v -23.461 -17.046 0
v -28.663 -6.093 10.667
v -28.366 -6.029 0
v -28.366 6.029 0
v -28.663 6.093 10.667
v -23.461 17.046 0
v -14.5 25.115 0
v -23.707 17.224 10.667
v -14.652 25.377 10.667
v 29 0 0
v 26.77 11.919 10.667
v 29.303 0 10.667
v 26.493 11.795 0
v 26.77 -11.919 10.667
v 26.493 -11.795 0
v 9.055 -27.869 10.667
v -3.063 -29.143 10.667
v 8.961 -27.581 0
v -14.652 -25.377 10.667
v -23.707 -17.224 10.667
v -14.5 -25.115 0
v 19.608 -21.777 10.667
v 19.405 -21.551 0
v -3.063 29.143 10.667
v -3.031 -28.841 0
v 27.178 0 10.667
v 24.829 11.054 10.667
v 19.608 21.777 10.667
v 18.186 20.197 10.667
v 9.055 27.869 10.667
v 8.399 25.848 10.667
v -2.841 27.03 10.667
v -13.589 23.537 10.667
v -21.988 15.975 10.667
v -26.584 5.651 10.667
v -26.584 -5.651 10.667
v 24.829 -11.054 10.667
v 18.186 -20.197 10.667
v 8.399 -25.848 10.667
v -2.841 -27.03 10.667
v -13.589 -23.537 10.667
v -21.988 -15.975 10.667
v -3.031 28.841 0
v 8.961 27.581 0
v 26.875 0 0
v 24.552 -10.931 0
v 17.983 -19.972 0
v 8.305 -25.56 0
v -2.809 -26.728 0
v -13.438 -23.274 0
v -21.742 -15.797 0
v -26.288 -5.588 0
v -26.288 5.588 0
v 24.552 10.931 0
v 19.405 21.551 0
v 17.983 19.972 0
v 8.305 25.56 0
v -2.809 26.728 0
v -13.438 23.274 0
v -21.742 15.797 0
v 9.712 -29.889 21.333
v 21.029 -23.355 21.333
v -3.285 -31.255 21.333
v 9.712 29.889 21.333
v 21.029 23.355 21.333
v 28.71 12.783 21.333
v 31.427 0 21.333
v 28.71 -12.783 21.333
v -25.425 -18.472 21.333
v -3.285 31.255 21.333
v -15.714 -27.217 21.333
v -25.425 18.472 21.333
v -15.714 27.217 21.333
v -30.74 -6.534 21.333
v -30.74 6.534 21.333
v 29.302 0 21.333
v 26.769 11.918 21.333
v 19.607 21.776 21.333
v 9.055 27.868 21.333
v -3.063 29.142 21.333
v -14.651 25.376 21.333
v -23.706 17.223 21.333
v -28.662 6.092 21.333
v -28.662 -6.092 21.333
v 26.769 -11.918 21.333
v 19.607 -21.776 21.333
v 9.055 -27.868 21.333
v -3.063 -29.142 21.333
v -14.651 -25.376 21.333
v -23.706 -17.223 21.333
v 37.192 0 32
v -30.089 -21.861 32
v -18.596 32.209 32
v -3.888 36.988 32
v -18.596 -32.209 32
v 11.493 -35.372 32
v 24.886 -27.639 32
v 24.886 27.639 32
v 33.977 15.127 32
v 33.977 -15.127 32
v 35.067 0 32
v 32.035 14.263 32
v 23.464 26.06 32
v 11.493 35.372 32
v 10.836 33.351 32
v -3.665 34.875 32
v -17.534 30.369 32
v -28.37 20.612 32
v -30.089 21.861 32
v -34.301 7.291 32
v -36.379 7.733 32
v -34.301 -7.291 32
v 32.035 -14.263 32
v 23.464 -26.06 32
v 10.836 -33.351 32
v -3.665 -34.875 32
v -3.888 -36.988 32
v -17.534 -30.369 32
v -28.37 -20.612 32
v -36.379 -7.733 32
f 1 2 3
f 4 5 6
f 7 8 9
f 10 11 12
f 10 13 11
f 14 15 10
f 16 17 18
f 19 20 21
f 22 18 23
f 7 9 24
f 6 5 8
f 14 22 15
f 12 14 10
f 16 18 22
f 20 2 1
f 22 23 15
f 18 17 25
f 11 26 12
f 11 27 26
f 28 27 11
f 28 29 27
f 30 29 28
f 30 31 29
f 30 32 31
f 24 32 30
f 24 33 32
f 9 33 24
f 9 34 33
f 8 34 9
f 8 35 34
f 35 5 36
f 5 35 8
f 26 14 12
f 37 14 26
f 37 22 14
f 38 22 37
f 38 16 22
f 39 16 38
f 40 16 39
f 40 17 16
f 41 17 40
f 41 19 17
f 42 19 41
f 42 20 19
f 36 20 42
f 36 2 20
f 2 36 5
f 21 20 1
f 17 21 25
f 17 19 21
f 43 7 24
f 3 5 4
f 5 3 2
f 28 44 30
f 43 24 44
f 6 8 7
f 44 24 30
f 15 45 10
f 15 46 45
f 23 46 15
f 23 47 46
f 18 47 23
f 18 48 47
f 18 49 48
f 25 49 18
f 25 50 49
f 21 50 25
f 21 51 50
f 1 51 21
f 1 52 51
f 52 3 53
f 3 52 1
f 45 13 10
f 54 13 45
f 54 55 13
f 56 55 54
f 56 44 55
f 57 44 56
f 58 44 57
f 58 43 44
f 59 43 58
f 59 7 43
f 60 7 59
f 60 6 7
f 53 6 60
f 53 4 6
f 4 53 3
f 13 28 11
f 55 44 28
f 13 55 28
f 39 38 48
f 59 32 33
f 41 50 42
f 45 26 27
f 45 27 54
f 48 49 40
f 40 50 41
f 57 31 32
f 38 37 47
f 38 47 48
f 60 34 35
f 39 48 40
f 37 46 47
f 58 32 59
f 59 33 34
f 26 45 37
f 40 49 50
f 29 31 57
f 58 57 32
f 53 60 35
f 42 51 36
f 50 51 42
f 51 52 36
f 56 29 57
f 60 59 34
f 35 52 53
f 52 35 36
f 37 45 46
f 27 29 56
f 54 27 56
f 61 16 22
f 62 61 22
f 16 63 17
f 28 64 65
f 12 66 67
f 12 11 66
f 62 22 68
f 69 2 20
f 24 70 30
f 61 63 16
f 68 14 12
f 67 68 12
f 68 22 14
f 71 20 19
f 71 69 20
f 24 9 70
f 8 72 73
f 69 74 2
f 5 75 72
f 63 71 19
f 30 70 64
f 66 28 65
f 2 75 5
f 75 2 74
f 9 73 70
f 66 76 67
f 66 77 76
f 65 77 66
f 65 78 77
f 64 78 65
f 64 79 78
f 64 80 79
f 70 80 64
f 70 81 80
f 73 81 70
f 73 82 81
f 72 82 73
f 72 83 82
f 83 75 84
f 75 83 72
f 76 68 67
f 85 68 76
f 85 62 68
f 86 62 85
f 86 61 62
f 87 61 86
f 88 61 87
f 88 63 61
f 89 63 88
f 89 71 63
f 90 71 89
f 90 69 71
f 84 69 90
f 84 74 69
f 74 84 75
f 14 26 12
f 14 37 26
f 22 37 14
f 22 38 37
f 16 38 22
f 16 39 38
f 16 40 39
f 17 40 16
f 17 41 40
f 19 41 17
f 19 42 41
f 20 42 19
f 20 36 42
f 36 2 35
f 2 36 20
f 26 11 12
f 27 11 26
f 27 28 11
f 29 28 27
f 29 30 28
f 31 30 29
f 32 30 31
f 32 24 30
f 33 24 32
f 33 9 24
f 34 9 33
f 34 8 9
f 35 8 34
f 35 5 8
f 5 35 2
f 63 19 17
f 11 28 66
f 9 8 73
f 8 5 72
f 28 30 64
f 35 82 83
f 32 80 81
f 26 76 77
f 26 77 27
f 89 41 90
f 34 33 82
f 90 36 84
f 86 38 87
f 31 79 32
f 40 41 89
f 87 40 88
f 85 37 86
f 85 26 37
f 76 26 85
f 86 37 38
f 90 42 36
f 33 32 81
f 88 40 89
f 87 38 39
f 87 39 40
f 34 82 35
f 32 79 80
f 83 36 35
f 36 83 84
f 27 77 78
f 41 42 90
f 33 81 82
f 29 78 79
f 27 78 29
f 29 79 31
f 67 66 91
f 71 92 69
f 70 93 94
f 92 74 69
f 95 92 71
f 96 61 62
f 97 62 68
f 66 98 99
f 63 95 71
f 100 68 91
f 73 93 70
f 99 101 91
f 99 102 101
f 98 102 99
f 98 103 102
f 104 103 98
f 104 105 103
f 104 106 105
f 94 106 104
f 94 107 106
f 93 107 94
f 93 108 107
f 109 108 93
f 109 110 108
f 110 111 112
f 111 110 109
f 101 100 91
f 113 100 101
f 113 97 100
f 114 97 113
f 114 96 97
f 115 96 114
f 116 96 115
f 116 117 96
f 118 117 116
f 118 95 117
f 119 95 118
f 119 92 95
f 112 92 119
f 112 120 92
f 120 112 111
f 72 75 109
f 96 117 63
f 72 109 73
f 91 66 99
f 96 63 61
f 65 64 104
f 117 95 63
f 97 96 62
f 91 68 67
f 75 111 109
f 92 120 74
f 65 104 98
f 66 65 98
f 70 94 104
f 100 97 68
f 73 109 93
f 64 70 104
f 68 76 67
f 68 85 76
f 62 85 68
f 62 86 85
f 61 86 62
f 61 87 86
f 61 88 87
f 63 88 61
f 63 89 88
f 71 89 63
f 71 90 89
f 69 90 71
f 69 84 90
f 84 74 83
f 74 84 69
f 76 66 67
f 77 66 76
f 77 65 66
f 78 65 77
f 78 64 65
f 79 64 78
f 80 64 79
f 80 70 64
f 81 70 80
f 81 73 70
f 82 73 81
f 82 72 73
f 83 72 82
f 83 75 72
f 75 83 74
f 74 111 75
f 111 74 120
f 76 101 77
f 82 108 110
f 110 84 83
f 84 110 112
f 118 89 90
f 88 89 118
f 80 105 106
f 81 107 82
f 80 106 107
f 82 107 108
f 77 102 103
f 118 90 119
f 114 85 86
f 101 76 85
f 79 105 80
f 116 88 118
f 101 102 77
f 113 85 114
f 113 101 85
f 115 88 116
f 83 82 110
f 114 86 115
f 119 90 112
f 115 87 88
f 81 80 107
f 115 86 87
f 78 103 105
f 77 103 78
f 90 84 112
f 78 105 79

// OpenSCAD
// file: basic.scad
/**
 * A basic Velocity stack module
 * @param od Outer diameter 
 * @param id Inner diameter (bore)
 * @param h Overall height of the stack
 * @param bell Diameter of bell
 * @param f flare factor (positive integer) defines the harshness of the curve
 */
module basic_vstack(od, id, h, bell, f=3, $fn=32)
{

	heightDivisions = $fn / 4;
	deltaHeight = h / heightDivisions;
	deltaR = (bell - od)/2;
	radius = od/2;
	innerRadius = id/2;

	for ( i = [0 : (heightDivisions - 1)]) {
		translate([0,0,i*deltaHeight]) difference() {
			cylinder(
					r1 = vstack_radius(i/heightDivisions,f)*deltaR+radius, 
					r2=vstack_radius((i+1)/heightDivisions,f)*deltaR+radius,
					h = deltaHeight,
					$fn = $fn
				);
			cylinder(
					r1 = vstack_radius(i/heightDivisions,f)*deltaR+innerRadius,
					r2 = vstack_radius((i+1)/heightDivisions,f)*deltaR+innerRadius,
					h = deltaHeight,
					$fn = $fn
				);
		}
	}
}

/**
 * produces the profile radius (from 0 to 1) for some given height (also from 0 to 1)
 * @param x distance along profile (height)
 */
function vstack_radius(x,f) = (pow(x,f));
// main file
include <basic.scad>;

basic_vstack(58, 53.75, 40, 90, $fn = 15);
